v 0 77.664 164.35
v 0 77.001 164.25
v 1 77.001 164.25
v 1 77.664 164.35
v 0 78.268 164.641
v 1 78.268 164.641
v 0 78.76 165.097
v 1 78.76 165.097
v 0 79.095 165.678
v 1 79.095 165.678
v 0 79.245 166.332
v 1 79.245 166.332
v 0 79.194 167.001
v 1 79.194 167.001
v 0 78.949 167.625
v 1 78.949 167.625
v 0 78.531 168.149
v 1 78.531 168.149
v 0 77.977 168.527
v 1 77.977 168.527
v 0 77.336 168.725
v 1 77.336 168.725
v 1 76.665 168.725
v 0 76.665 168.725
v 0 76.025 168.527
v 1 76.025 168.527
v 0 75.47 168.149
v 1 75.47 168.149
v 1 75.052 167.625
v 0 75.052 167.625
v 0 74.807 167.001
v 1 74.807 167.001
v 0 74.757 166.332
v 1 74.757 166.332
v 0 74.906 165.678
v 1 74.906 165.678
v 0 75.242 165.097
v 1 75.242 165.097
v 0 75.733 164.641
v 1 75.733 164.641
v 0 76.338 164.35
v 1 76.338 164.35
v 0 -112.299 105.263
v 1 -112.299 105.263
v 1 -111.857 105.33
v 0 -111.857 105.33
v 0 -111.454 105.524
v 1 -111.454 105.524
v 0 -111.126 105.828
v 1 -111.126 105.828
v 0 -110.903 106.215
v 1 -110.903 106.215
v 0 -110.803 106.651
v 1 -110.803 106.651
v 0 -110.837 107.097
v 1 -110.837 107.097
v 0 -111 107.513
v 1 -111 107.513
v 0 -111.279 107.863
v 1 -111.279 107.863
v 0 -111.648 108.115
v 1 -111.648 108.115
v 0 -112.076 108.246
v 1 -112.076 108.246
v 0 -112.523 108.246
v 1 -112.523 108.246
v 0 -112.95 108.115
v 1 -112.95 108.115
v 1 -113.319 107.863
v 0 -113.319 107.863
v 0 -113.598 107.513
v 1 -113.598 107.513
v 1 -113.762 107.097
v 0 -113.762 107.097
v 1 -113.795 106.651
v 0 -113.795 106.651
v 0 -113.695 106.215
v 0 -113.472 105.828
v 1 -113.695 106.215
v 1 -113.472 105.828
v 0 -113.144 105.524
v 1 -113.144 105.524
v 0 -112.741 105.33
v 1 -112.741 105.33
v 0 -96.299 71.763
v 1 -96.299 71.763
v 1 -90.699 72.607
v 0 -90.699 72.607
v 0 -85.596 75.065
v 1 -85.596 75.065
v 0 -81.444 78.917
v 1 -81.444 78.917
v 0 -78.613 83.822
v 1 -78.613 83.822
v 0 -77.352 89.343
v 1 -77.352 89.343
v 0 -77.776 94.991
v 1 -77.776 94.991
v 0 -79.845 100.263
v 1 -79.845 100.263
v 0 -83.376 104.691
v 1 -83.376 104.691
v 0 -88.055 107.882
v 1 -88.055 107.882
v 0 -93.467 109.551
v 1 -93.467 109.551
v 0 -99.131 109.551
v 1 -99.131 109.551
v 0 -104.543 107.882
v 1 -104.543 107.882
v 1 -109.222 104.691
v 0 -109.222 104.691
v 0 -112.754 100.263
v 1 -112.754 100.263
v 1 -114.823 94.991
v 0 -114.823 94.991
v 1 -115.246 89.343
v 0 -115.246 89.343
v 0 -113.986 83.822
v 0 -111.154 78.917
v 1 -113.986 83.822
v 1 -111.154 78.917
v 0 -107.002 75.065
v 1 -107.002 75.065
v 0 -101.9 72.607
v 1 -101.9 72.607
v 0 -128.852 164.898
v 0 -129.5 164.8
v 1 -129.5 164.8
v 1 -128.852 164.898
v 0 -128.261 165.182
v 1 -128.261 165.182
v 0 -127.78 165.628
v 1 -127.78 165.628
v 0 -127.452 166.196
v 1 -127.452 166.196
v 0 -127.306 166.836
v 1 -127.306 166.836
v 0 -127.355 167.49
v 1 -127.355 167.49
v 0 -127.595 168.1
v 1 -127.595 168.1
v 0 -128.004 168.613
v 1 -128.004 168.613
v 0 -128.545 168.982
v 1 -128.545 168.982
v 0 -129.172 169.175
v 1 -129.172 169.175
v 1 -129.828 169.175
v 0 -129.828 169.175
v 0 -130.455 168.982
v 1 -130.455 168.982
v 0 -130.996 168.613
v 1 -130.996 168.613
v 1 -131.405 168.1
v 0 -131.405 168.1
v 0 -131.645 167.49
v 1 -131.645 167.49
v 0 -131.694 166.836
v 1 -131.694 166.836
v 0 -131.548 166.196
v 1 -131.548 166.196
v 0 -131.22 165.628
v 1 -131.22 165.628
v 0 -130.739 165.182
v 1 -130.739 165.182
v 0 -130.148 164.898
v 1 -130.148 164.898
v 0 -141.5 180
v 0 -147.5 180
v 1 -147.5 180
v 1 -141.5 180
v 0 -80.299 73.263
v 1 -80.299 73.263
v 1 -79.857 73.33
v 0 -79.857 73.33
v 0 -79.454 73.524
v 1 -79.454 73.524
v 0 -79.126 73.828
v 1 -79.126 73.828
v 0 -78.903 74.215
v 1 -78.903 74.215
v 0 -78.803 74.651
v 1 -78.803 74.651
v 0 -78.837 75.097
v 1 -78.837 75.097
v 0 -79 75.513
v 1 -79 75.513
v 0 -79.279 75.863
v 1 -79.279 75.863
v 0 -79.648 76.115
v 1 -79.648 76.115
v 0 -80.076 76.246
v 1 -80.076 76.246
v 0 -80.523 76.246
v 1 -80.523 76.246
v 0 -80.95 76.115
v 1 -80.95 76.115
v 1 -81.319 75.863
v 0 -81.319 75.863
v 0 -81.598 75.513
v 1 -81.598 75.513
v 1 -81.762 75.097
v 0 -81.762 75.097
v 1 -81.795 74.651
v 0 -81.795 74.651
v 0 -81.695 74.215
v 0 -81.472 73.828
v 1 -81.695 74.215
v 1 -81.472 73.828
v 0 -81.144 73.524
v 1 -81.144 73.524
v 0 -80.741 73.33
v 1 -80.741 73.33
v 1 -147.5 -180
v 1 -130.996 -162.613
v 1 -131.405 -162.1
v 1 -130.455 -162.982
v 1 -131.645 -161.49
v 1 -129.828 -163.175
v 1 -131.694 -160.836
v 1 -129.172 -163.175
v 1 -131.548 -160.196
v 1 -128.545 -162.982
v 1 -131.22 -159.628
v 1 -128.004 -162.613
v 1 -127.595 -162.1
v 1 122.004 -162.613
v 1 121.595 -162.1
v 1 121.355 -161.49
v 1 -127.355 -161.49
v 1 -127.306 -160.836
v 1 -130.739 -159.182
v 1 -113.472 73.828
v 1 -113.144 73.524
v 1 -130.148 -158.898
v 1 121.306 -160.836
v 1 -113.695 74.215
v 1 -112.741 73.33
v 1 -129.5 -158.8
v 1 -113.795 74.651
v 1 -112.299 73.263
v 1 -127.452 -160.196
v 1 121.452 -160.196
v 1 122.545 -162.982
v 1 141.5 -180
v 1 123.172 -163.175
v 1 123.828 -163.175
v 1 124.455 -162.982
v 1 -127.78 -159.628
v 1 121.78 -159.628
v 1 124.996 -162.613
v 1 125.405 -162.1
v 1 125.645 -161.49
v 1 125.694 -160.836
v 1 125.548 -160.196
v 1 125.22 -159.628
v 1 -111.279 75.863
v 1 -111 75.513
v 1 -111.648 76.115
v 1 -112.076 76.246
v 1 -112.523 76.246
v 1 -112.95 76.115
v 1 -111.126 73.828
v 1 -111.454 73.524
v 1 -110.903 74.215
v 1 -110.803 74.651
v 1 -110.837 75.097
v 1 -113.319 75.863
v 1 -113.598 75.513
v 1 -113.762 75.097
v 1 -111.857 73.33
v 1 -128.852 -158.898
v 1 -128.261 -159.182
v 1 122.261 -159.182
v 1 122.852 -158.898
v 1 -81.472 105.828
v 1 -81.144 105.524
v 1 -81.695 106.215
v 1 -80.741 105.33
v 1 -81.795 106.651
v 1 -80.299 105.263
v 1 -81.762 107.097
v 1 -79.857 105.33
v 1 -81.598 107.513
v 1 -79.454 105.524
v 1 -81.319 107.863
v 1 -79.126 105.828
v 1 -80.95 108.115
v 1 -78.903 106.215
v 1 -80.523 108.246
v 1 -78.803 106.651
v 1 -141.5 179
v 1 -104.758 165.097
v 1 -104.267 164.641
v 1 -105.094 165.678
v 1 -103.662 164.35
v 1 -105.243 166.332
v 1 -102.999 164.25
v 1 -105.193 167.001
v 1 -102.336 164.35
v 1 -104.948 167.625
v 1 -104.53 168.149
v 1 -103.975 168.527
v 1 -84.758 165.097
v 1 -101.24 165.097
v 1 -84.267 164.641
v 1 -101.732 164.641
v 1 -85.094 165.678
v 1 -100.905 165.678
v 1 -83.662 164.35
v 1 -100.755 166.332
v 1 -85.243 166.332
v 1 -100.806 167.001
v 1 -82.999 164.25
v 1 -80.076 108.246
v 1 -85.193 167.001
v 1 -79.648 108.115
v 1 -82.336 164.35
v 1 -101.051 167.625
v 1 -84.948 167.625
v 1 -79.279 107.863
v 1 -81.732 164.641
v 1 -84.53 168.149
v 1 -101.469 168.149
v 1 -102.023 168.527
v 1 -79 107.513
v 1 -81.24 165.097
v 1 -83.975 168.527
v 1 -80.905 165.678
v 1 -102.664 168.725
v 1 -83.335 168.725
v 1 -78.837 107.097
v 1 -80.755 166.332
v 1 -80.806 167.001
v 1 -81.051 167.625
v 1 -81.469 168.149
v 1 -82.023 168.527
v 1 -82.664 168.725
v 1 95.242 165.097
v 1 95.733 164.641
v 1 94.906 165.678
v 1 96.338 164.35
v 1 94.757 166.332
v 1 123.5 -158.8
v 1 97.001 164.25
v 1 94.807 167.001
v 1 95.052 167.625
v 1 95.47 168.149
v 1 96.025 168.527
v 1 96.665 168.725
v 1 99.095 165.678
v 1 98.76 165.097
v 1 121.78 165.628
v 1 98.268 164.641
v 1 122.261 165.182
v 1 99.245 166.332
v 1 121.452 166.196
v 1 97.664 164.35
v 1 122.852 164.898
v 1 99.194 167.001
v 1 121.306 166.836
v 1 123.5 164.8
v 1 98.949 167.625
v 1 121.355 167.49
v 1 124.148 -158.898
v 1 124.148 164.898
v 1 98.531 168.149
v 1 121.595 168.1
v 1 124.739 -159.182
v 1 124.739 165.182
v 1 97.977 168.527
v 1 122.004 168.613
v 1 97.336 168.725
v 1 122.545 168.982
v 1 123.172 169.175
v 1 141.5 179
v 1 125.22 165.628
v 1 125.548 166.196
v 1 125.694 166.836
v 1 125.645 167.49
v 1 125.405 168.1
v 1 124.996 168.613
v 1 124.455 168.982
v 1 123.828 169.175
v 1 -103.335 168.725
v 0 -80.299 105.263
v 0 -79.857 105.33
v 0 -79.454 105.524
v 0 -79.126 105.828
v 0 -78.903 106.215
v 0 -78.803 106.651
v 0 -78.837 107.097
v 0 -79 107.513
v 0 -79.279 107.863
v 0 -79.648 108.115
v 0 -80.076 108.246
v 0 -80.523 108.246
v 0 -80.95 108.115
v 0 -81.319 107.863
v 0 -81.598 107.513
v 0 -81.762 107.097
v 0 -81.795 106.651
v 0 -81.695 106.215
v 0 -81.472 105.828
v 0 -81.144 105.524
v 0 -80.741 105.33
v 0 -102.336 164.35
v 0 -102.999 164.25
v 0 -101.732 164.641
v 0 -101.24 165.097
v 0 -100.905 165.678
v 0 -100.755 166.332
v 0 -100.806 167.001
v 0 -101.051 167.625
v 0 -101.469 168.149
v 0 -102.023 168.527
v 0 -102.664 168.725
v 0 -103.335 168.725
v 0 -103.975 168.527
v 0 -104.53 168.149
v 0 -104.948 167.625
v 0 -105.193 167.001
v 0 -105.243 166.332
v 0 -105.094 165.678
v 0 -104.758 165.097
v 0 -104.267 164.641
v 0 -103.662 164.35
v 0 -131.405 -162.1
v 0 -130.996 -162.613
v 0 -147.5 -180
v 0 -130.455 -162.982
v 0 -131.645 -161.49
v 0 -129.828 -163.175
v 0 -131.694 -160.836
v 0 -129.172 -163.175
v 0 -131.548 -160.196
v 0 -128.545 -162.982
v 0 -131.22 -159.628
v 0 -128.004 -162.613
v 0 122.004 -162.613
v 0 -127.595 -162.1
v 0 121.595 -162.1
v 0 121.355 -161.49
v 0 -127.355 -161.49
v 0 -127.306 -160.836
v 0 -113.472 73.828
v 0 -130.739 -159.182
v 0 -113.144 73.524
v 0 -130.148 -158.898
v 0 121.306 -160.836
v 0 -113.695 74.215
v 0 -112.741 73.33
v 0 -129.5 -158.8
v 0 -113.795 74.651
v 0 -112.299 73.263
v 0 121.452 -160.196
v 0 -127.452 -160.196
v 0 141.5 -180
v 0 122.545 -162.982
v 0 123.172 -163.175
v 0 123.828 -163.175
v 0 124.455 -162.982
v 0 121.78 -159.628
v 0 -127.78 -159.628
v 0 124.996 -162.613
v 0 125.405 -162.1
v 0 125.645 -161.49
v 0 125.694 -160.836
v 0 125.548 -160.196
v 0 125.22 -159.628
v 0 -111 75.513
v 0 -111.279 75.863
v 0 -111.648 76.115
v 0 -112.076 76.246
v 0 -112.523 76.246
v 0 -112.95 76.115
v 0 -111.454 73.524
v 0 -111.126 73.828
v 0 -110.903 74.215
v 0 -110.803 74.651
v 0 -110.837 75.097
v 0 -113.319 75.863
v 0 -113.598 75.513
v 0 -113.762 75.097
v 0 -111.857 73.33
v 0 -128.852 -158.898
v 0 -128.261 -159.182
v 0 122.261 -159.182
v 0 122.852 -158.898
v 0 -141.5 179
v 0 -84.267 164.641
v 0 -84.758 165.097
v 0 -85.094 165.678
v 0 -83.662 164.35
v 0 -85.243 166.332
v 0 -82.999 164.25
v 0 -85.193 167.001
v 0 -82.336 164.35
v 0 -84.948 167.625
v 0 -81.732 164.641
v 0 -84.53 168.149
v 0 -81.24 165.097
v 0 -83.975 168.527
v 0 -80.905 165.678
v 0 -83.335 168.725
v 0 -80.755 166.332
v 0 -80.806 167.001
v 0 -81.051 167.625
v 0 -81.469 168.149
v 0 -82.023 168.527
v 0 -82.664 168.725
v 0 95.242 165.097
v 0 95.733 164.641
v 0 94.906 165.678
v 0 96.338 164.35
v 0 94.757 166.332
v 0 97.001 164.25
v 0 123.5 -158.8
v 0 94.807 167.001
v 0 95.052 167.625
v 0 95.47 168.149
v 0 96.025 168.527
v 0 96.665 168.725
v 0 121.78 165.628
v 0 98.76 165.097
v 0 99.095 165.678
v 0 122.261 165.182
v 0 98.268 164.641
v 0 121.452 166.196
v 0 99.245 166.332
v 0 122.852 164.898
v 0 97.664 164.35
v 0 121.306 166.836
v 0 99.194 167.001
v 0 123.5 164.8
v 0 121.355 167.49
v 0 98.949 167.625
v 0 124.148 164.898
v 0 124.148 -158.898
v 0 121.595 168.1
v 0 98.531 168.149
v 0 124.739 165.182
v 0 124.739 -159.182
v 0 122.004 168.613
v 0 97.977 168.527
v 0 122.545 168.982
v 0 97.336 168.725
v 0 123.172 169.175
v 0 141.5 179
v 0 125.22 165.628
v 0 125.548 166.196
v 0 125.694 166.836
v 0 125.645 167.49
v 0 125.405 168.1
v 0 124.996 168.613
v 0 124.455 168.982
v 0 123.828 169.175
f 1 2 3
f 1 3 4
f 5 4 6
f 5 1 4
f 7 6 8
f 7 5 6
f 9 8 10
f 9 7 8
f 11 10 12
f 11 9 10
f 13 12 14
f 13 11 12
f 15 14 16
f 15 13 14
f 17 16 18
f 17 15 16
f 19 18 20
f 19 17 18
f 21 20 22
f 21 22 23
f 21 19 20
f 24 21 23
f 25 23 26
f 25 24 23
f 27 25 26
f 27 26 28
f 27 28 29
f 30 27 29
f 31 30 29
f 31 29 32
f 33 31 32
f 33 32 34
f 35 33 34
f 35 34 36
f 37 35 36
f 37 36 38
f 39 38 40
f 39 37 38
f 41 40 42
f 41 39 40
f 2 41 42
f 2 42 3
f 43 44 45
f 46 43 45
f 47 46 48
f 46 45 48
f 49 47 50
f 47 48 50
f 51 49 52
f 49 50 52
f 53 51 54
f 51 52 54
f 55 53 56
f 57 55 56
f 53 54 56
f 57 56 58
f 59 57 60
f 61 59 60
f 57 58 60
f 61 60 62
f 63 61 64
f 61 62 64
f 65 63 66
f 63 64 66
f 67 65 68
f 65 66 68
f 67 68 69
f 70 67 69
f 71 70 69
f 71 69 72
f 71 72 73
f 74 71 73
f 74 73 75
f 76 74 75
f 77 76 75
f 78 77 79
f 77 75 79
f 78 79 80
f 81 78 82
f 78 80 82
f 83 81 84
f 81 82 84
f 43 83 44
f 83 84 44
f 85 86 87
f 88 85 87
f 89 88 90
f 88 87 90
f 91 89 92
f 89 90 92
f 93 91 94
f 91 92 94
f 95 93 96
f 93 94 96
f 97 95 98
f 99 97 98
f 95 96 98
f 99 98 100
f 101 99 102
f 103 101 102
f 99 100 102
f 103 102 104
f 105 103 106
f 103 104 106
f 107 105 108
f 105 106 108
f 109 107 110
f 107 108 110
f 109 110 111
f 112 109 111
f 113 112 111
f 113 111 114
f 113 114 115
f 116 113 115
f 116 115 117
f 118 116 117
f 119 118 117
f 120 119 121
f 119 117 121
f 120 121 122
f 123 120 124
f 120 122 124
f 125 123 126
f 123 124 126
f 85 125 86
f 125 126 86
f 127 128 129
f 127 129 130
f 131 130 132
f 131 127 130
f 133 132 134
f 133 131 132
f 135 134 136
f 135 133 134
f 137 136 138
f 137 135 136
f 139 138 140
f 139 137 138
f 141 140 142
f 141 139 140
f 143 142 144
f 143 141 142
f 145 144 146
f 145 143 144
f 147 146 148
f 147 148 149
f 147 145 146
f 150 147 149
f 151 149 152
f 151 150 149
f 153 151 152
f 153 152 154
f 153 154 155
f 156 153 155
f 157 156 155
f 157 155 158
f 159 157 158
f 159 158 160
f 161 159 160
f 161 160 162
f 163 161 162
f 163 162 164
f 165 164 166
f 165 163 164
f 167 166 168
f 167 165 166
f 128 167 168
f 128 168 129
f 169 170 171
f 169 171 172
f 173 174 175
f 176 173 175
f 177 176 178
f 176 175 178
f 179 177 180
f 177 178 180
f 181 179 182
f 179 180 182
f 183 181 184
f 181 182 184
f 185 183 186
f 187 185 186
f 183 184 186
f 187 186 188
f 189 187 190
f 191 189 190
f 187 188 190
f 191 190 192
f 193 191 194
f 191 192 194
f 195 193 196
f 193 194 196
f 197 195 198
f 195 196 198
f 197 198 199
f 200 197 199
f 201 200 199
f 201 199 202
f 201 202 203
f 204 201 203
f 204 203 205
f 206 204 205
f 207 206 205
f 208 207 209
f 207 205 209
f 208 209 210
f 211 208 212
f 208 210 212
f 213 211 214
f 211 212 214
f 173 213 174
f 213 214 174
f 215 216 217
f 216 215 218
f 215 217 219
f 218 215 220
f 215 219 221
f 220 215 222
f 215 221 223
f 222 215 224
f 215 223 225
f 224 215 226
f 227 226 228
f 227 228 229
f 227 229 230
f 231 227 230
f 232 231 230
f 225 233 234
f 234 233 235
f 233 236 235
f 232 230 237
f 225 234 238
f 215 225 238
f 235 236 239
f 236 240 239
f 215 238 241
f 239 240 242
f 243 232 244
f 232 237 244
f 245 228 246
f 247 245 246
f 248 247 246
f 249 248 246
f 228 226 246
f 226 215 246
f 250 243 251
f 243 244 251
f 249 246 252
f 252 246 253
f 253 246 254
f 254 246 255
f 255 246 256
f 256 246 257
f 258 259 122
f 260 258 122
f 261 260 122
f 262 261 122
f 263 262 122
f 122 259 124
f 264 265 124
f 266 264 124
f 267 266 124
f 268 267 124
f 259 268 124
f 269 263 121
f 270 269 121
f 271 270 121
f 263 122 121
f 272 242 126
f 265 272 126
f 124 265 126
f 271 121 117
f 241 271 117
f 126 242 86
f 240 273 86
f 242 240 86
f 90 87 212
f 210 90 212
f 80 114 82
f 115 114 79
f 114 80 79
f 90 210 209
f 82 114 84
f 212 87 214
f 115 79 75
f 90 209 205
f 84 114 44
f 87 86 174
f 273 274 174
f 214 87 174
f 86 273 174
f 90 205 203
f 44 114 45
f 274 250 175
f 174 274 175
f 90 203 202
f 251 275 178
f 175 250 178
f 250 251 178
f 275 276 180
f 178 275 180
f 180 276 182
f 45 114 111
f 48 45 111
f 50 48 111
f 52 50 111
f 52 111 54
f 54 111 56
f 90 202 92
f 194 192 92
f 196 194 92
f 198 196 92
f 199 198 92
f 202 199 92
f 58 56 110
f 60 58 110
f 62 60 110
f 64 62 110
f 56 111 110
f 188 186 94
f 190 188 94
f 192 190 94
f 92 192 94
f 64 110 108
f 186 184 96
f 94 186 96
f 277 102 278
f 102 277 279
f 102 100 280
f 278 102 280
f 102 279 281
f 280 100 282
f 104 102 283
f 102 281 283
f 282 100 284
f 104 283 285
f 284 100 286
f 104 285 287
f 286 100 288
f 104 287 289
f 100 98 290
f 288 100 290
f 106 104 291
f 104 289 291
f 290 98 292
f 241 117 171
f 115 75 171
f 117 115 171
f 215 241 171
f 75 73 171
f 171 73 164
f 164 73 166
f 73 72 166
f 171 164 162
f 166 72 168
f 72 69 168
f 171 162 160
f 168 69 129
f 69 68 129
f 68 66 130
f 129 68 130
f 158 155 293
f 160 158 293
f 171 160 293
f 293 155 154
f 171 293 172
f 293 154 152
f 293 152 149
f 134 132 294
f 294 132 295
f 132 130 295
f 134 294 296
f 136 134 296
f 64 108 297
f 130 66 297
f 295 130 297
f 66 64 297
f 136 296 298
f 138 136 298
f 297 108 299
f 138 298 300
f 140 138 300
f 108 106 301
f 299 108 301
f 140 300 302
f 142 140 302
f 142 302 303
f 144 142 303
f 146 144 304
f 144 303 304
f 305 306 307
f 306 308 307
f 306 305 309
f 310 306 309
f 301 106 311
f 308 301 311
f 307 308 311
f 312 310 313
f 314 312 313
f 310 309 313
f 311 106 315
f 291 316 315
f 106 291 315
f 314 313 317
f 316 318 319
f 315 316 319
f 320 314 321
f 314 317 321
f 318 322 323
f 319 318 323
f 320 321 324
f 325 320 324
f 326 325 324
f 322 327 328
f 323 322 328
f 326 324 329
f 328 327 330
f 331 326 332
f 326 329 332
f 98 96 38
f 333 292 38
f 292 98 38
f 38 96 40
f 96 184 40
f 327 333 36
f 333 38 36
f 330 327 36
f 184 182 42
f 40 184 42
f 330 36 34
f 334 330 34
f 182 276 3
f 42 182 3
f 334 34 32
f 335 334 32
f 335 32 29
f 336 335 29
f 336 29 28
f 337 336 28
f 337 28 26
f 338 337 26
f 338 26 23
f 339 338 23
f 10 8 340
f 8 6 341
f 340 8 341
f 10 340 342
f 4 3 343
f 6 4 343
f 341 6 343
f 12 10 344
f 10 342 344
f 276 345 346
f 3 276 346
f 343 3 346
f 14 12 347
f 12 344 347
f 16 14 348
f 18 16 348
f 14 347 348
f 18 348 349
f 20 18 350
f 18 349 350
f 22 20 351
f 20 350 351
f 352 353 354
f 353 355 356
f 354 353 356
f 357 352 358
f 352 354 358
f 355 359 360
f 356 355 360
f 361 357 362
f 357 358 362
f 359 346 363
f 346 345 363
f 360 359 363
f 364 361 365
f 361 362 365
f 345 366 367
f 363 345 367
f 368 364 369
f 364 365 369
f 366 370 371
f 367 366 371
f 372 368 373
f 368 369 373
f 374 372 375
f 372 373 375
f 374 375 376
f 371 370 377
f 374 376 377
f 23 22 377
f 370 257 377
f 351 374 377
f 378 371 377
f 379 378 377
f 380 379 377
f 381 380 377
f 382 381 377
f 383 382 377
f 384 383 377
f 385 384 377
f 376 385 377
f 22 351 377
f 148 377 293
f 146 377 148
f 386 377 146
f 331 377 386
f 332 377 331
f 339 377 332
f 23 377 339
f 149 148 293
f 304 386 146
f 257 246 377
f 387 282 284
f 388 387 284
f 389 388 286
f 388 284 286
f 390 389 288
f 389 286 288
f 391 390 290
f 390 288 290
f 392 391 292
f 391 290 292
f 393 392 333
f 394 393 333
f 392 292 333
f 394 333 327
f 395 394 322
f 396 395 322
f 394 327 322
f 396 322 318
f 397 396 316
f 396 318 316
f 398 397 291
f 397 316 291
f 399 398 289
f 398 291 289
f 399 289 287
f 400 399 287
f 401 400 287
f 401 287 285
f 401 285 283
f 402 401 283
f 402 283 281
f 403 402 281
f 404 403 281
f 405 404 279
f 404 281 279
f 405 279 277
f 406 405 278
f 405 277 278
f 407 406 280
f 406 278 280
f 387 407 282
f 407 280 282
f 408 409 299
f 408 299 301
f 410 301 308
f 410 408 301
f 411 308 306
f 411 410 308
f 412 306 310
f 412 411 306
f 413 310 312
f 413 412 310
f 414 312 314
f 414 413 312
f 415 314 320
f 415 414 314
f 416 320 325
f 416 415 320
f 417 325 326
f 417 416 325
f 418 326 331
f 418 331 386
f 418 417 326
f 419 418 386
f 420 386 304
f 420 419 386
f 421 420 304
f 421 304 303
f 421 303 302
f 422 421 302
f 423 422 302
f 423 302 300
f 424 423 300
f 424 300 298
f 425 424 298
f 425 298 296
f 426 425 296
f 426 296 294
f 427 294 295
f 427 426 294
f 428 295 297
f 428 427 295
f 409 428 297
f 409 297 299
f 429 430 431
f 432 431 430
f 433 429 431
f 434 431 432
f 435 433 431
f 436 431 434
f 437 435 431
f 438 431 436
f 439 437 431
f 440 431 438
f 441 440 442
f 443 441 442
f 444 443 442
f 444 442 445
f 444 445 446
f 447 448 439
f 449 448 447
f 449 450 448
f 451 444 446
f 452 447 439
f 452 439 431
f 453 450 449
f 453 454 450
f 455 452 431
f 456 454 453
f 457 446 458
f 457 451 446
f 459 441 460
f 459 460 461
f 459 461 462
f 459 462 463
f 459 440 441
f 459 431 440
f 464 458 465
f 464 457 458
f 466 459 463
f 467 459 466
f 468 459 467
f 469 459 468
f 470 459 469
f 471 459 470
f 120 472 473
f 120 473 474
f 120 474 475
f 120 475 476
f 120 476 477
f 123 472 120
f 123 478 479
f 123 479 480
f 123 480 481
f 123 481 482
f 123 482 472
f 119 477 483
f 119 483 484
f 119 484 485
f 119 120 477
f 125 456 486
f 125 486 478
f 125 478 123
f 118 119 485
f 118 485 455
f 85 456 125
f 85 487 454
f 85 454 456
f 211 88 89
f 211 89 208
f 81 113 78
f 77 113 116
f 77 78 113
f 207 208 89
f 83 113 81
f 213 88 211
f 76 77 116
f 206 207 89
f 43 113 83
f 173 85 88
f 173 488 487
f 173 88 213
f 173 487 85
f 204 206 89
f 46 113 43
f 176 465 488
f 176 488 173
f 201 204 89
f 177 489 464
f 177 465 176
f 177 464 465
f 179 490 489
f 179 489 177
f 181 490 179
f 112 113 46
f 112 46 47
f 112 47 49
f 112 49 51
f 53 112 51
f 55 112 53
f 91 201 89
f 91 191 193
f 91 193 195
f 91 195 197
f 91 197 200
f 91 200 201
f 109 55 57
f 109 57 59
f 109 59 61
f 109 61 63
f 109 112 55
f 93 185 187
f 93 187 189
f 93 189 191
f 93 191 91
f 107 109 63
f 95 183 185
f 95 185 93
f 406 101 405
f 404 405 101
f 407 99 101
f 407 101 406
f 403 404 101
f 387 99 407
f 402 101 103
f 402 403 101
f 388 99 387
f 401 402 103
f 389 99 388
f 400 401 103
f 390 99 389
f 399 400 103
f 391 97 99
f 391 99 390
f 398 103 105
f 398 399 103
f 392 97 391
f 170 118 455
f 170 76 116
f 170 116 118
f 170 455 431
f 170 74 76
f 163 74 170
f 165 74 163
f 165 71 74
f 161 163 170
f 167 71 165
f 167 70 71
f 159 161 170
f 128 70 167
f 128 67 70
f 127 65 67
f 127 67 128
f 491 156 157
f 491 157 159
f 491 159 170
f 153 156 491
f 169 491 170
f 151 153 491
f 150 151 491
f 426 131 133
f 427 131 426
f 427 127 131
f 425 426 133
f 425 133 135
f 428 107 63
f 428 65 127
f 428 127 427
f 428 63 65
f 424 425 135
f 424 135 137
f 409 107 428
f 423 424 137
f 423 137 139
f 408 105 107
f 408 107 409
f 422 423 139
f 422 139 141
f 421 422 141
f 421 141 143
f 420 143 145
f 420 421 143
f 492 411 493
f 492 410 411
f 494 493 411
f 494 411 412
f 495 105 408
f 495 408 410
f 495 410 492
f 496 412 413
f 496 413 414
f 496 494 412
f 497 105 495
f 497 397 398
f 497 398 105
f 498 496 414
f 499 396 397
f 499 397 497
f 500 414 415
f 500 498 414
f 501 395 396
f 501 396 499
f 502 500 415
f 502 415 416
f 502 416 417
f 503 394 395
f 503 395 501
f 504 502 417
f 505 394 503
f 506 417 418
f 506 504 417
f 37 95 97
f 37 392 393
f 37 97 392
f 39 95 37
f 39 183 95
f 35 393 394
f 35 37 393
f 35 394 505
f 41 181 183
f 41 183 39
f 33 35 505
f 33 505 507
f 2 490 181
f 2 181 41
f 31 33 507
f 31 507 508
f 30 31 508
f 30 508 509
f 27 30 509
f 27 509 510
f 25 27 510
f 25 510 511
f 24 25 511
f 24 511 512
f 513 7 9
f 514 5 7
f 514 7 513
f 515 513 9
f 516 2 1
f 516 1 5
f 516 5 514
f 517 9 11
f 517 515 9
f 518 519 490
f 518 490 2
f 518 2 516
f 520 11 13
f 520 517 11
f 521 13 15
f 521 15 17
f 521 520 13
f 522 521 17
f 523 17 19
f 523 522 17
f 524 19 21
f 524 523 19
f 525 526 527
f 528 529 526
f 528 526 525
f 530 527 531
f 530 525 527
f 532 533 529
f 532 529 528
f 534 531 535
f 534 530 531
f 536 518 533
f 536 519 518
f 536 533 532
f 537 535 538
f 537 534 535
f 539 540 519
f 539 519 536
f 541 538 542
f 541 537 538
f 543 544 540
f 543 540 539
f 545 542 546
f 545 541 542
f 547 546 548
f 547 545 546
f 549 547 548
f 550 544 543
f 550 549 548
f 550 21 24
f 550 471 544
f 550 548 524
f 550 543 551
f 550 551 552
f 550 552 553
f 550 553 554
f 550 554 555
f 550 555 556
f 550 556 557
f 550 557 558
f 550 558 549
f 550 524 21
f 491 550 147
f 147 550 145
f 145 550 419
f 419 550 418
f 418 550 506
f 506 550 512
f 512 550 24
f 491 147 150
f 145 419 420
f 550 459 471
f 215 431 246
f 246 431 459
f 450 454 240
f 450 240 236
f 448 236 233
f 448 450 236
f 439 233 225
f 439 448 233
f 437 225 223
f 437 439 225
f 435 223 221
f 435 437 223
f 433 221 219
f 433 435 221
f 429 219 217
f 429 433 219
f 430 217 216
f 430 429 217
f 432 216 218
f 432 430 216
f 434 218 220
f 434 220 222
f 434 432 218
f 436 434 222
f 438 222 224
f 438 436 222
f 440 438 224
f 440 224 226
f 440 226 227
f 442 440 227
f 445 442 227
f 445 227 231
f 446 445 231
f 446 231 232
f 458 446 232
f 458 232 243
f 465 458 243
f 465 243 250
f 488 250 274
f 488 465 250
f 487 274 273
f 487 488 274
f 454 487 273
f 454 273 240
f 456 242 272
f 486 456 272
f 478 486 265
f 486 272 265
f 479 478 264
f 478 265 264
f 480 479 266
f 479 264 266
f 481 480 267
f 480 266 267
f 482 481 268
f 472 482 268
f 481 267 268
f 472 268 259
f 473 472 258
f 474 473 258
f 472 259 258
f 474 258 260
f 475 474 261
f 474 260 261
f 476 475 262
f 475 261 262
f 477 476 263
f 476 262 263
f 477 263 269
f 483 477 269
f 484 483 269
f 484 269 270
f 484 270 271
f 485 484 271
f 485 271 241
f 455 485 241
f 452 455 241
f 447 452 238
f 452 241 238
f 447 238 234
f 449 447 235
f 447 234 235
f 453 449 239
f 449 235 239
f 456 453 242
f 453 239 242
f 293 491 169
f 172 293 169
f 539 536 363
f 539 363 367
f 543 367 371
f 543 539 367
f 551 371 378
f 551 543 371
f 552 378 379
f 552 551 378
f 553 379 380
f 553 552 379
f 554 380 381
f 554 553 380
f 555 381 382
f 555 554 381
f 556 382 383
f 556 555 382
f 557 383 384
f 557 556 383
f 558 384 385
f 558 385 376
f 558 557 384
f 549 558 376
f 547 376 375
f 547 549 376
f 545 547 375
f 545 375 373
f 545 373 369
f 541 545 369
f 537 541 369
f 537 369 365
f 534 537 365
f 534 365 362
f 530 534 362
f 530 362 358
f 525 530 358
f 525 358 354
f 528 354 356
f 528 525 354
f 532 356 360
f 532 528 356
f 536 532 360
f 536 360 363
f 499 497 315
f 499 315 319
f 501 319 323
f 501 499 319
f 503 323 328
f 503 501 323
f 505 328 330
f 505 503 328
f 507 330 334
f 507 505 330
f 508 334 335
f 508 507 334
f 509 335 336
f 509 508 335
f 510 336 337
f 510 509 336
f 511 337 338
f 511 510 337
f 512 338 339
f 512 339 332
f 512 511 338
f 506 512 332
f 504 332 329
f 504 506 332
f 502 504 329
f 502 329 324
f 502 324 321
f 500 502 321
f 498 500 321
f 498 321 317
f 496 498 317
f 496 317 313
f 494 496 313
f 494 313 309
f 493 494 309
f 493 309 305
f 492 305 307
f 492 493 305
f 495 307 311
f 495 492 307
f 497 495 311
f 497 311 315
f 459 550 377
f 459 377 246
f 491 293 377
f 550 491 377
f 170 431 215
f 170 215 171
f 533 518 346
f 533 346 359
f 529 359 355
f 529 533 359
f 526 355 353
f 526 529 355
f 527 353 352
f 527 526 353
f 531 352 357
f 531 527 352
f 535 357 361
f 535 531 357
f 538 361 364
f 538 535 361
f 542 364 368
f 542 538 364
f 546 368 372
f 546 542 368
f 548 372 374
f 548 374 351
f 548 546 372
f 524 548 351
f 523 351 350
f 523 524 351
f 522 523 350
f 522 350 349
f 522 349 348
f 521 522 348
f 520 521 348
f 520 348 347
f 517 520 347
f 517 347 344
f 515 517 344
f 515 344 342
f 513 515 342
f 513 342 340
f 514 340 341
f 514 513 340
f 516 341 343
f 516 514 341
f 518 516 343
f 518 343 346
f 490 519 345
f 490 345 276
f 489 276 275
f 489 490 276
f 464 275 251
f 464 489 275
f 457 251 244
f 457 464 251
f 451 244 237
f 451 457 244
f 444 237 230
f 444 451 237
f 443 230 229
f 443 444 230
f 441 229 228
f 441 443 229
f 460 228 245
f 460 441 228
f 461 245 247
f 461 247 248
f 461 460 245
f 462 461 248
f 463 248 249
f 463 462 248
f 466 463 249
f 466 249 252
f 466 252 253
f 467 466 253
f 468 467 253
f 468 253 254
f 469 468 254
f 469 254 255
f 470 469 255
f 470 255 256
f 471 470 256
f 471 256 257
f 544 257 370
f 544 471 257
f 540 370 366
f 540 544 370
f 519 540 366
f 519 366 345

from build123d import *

# Parameters (mm, degrees)
SKETCH1_W           = 360
SKETCH1_H           = 283
SKETCH1_R           = 2.2
SKETCH1_R_2         = 2.25
BOSS_EXTRUDE1_DEPTH = 1
SKETCH3_R           = 18.999999993
SKETCH3_R_2         = 1.499999993
SKETCH3_W           = 1
SKETCH3_H           = 283
CUT_EXTRUDE1_DEPTH  = 1
SKETCH4_W           = 360
SKETCH4_H           = 6
BOSS_EXTRUDE2_DEPTH = 1


with BuildPart() as part:
    # Sketch1 → Boss-Extrude1 (new body)
    with BuildSketch(Plane(origin=(0, 0, 0), x_dir=(0, 0, -1), z_dir=(1, 0, 0))):
        Rectangle(SKETCH1_W, SKETCH1_H)
        with Locations((-167, 123.5)):
            Circle(SKETCH1_R, mode=Mode.SUBTRACT)
        with Locations((-167, -129.5)):
            Circle(SKETCH1_R, mode=Mode.SUBTRACT)
        with Locations(Location((161, 123.5, 0), (0, 0, 180))):
            Circle(SKETCH1_R, mode=Mode.SUBTRACT)
        with Locations(Location((161, -129.5, 0), (0, 0, 180))):
            Circle(SKETCH1_R, mode=Mode.SUBTRACT)
        with Locations((-166.5, 97.000820447)):
            Circle(SKETCH1_R_2, mode=Mode.SUBTRACT)
        with Locations((-166.5, 77.000820447)):
            Circle(SKETCH1_R_2, mode=Mode.SUBTRACT)
        with Locations((-166.5, -82.999179553)):
            Circle(SKETCH1_R_2, mode=Mode.SUBTRACT)
        with Locations((-166.5, -102.999179553)):
            Circle(SKETCH1_R_2, mode=Mode.SUBTRACT)
    extrude(amount=BOSS_EXTRUDE1_DEPTH)

    # Sketch3 → Cut-Extrude1 (cut)
    with BuildSketch(Plane(origin=(1, 0, 0), x_dir=(0, 0, -1), z_dir=(1, 0, 0))):
        with Locations((-90.763094033, -96.299179553)):
            Circle(SKETCH3_R)
        with Locations((-106.763094033, -80.299179553)):
            Circle(SKETCH3_R_2)
        with Locations((-74.763094033, -80.299179553)):
            Circle(SKETCH3_R_2)
        with Locations((-74.763094033, -112.299179553)):
            Circle(SKETCH3_R_2)
        with Locations((-106.763094033, -112.299179553)):
            Circle(SKETCH3_R_2)
        with Locations((-179.5, 0)):
            Rectangle(SKETCH3_W, SKETCH3_H)
    extrude(amount=-CUT_EXTRUDE1_DEPTH, mode=Mode.SUBTRACT)

    # Sketch4 → Boss-Extrude2 (add)
    with BuildSketch(Plane.ZY):
        with Locations((0, -144.5)):
            Rectangle(SKETCH4_W, SKETCH4_H)
    extrude(amount=-BOSS_EXTRUDE2_DEPTH)


solid = part.part
